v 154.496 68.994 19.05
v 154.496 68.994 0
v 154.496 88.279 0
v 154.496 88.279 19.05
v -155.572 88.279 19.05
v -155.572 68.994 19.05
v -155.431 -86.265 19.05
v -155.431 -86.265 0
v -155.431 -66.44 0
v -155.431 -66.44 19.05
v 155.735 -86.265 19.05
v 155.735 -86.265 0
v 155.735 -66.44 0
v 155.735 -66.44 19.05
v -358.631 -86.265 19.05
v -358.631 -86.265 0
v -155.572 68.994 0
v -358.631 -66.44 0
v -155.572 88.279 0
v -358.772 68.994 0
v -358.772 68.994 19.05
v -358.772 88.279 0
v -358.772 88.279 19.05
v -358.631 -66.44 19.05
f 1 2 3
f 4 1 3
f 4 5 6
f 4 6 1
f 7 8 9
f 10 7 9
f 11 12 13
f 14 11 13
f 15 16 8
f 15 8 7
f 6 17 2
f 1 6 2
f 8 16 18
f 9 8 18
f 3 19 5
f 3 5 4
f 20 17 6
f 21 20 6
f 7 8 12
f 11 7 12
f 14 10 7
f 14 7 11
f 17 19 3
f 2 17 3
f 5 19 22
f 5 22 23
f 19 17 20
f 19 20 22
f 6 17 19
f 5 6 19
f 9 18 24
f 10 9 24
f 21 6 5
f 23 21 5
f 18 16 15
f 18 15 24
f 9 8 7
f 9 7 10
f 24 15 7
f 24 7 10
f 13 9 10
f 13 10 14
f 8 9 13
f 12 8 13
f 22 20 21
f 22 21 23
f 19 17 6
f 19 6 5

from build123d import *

# Parameters (mm, degrees)
F0_W     = 311.166420579
F0_H     = 19.8255479336
F1_DEPTH = 19.05
F0_W_2   = 310.0688308477
F0_H_2   = 19.2848816514
F2_DEPTH = 203.2


with BuildPart() as f1:
    # F0 (on Top) → F1 (new body)
    with BuildSketch(Plane.XY):
        with Locations((0.1521036029, -76.3522833586)):
            Rectangle(F0_W, F0_H)
    extrude(amount=F1_DEPTH)


with BuildPart() as f1b:
    # F0 (on Top) → F1, piece 2 (new body)
    with BuildSketch(Plane.XY):
        with Locations((-0.5380138755, 78.636135906)):
            Rectangle(F0_W_2, F0_H_2)
    extrude(amount=F1_DEPTH)


with BuildPart() as f2:
    # F2 (new): a face of the model
    f2_faces = [f1b.part.faces().sort_by_distance(p)[0] for p in [
        (-155.5724292994, 78.636135906, 9.525),
    ]]
    extrude(f2_faces, amount=F2_DEPTH)


with BuildPart() as f2b:
    # F2#2 (new): a face of the model
    f2_2_faces = [f1.part.faces().sort_by_distance(p)[0] for p in [
        (-155.4311066866, -76.3522833586, 9.525),
    ]]
    extrude(f2_2_faces, amount=F2_DEPTH)


solid = Compound([f1.part, f1b.part, f2.part, f2b.part])
